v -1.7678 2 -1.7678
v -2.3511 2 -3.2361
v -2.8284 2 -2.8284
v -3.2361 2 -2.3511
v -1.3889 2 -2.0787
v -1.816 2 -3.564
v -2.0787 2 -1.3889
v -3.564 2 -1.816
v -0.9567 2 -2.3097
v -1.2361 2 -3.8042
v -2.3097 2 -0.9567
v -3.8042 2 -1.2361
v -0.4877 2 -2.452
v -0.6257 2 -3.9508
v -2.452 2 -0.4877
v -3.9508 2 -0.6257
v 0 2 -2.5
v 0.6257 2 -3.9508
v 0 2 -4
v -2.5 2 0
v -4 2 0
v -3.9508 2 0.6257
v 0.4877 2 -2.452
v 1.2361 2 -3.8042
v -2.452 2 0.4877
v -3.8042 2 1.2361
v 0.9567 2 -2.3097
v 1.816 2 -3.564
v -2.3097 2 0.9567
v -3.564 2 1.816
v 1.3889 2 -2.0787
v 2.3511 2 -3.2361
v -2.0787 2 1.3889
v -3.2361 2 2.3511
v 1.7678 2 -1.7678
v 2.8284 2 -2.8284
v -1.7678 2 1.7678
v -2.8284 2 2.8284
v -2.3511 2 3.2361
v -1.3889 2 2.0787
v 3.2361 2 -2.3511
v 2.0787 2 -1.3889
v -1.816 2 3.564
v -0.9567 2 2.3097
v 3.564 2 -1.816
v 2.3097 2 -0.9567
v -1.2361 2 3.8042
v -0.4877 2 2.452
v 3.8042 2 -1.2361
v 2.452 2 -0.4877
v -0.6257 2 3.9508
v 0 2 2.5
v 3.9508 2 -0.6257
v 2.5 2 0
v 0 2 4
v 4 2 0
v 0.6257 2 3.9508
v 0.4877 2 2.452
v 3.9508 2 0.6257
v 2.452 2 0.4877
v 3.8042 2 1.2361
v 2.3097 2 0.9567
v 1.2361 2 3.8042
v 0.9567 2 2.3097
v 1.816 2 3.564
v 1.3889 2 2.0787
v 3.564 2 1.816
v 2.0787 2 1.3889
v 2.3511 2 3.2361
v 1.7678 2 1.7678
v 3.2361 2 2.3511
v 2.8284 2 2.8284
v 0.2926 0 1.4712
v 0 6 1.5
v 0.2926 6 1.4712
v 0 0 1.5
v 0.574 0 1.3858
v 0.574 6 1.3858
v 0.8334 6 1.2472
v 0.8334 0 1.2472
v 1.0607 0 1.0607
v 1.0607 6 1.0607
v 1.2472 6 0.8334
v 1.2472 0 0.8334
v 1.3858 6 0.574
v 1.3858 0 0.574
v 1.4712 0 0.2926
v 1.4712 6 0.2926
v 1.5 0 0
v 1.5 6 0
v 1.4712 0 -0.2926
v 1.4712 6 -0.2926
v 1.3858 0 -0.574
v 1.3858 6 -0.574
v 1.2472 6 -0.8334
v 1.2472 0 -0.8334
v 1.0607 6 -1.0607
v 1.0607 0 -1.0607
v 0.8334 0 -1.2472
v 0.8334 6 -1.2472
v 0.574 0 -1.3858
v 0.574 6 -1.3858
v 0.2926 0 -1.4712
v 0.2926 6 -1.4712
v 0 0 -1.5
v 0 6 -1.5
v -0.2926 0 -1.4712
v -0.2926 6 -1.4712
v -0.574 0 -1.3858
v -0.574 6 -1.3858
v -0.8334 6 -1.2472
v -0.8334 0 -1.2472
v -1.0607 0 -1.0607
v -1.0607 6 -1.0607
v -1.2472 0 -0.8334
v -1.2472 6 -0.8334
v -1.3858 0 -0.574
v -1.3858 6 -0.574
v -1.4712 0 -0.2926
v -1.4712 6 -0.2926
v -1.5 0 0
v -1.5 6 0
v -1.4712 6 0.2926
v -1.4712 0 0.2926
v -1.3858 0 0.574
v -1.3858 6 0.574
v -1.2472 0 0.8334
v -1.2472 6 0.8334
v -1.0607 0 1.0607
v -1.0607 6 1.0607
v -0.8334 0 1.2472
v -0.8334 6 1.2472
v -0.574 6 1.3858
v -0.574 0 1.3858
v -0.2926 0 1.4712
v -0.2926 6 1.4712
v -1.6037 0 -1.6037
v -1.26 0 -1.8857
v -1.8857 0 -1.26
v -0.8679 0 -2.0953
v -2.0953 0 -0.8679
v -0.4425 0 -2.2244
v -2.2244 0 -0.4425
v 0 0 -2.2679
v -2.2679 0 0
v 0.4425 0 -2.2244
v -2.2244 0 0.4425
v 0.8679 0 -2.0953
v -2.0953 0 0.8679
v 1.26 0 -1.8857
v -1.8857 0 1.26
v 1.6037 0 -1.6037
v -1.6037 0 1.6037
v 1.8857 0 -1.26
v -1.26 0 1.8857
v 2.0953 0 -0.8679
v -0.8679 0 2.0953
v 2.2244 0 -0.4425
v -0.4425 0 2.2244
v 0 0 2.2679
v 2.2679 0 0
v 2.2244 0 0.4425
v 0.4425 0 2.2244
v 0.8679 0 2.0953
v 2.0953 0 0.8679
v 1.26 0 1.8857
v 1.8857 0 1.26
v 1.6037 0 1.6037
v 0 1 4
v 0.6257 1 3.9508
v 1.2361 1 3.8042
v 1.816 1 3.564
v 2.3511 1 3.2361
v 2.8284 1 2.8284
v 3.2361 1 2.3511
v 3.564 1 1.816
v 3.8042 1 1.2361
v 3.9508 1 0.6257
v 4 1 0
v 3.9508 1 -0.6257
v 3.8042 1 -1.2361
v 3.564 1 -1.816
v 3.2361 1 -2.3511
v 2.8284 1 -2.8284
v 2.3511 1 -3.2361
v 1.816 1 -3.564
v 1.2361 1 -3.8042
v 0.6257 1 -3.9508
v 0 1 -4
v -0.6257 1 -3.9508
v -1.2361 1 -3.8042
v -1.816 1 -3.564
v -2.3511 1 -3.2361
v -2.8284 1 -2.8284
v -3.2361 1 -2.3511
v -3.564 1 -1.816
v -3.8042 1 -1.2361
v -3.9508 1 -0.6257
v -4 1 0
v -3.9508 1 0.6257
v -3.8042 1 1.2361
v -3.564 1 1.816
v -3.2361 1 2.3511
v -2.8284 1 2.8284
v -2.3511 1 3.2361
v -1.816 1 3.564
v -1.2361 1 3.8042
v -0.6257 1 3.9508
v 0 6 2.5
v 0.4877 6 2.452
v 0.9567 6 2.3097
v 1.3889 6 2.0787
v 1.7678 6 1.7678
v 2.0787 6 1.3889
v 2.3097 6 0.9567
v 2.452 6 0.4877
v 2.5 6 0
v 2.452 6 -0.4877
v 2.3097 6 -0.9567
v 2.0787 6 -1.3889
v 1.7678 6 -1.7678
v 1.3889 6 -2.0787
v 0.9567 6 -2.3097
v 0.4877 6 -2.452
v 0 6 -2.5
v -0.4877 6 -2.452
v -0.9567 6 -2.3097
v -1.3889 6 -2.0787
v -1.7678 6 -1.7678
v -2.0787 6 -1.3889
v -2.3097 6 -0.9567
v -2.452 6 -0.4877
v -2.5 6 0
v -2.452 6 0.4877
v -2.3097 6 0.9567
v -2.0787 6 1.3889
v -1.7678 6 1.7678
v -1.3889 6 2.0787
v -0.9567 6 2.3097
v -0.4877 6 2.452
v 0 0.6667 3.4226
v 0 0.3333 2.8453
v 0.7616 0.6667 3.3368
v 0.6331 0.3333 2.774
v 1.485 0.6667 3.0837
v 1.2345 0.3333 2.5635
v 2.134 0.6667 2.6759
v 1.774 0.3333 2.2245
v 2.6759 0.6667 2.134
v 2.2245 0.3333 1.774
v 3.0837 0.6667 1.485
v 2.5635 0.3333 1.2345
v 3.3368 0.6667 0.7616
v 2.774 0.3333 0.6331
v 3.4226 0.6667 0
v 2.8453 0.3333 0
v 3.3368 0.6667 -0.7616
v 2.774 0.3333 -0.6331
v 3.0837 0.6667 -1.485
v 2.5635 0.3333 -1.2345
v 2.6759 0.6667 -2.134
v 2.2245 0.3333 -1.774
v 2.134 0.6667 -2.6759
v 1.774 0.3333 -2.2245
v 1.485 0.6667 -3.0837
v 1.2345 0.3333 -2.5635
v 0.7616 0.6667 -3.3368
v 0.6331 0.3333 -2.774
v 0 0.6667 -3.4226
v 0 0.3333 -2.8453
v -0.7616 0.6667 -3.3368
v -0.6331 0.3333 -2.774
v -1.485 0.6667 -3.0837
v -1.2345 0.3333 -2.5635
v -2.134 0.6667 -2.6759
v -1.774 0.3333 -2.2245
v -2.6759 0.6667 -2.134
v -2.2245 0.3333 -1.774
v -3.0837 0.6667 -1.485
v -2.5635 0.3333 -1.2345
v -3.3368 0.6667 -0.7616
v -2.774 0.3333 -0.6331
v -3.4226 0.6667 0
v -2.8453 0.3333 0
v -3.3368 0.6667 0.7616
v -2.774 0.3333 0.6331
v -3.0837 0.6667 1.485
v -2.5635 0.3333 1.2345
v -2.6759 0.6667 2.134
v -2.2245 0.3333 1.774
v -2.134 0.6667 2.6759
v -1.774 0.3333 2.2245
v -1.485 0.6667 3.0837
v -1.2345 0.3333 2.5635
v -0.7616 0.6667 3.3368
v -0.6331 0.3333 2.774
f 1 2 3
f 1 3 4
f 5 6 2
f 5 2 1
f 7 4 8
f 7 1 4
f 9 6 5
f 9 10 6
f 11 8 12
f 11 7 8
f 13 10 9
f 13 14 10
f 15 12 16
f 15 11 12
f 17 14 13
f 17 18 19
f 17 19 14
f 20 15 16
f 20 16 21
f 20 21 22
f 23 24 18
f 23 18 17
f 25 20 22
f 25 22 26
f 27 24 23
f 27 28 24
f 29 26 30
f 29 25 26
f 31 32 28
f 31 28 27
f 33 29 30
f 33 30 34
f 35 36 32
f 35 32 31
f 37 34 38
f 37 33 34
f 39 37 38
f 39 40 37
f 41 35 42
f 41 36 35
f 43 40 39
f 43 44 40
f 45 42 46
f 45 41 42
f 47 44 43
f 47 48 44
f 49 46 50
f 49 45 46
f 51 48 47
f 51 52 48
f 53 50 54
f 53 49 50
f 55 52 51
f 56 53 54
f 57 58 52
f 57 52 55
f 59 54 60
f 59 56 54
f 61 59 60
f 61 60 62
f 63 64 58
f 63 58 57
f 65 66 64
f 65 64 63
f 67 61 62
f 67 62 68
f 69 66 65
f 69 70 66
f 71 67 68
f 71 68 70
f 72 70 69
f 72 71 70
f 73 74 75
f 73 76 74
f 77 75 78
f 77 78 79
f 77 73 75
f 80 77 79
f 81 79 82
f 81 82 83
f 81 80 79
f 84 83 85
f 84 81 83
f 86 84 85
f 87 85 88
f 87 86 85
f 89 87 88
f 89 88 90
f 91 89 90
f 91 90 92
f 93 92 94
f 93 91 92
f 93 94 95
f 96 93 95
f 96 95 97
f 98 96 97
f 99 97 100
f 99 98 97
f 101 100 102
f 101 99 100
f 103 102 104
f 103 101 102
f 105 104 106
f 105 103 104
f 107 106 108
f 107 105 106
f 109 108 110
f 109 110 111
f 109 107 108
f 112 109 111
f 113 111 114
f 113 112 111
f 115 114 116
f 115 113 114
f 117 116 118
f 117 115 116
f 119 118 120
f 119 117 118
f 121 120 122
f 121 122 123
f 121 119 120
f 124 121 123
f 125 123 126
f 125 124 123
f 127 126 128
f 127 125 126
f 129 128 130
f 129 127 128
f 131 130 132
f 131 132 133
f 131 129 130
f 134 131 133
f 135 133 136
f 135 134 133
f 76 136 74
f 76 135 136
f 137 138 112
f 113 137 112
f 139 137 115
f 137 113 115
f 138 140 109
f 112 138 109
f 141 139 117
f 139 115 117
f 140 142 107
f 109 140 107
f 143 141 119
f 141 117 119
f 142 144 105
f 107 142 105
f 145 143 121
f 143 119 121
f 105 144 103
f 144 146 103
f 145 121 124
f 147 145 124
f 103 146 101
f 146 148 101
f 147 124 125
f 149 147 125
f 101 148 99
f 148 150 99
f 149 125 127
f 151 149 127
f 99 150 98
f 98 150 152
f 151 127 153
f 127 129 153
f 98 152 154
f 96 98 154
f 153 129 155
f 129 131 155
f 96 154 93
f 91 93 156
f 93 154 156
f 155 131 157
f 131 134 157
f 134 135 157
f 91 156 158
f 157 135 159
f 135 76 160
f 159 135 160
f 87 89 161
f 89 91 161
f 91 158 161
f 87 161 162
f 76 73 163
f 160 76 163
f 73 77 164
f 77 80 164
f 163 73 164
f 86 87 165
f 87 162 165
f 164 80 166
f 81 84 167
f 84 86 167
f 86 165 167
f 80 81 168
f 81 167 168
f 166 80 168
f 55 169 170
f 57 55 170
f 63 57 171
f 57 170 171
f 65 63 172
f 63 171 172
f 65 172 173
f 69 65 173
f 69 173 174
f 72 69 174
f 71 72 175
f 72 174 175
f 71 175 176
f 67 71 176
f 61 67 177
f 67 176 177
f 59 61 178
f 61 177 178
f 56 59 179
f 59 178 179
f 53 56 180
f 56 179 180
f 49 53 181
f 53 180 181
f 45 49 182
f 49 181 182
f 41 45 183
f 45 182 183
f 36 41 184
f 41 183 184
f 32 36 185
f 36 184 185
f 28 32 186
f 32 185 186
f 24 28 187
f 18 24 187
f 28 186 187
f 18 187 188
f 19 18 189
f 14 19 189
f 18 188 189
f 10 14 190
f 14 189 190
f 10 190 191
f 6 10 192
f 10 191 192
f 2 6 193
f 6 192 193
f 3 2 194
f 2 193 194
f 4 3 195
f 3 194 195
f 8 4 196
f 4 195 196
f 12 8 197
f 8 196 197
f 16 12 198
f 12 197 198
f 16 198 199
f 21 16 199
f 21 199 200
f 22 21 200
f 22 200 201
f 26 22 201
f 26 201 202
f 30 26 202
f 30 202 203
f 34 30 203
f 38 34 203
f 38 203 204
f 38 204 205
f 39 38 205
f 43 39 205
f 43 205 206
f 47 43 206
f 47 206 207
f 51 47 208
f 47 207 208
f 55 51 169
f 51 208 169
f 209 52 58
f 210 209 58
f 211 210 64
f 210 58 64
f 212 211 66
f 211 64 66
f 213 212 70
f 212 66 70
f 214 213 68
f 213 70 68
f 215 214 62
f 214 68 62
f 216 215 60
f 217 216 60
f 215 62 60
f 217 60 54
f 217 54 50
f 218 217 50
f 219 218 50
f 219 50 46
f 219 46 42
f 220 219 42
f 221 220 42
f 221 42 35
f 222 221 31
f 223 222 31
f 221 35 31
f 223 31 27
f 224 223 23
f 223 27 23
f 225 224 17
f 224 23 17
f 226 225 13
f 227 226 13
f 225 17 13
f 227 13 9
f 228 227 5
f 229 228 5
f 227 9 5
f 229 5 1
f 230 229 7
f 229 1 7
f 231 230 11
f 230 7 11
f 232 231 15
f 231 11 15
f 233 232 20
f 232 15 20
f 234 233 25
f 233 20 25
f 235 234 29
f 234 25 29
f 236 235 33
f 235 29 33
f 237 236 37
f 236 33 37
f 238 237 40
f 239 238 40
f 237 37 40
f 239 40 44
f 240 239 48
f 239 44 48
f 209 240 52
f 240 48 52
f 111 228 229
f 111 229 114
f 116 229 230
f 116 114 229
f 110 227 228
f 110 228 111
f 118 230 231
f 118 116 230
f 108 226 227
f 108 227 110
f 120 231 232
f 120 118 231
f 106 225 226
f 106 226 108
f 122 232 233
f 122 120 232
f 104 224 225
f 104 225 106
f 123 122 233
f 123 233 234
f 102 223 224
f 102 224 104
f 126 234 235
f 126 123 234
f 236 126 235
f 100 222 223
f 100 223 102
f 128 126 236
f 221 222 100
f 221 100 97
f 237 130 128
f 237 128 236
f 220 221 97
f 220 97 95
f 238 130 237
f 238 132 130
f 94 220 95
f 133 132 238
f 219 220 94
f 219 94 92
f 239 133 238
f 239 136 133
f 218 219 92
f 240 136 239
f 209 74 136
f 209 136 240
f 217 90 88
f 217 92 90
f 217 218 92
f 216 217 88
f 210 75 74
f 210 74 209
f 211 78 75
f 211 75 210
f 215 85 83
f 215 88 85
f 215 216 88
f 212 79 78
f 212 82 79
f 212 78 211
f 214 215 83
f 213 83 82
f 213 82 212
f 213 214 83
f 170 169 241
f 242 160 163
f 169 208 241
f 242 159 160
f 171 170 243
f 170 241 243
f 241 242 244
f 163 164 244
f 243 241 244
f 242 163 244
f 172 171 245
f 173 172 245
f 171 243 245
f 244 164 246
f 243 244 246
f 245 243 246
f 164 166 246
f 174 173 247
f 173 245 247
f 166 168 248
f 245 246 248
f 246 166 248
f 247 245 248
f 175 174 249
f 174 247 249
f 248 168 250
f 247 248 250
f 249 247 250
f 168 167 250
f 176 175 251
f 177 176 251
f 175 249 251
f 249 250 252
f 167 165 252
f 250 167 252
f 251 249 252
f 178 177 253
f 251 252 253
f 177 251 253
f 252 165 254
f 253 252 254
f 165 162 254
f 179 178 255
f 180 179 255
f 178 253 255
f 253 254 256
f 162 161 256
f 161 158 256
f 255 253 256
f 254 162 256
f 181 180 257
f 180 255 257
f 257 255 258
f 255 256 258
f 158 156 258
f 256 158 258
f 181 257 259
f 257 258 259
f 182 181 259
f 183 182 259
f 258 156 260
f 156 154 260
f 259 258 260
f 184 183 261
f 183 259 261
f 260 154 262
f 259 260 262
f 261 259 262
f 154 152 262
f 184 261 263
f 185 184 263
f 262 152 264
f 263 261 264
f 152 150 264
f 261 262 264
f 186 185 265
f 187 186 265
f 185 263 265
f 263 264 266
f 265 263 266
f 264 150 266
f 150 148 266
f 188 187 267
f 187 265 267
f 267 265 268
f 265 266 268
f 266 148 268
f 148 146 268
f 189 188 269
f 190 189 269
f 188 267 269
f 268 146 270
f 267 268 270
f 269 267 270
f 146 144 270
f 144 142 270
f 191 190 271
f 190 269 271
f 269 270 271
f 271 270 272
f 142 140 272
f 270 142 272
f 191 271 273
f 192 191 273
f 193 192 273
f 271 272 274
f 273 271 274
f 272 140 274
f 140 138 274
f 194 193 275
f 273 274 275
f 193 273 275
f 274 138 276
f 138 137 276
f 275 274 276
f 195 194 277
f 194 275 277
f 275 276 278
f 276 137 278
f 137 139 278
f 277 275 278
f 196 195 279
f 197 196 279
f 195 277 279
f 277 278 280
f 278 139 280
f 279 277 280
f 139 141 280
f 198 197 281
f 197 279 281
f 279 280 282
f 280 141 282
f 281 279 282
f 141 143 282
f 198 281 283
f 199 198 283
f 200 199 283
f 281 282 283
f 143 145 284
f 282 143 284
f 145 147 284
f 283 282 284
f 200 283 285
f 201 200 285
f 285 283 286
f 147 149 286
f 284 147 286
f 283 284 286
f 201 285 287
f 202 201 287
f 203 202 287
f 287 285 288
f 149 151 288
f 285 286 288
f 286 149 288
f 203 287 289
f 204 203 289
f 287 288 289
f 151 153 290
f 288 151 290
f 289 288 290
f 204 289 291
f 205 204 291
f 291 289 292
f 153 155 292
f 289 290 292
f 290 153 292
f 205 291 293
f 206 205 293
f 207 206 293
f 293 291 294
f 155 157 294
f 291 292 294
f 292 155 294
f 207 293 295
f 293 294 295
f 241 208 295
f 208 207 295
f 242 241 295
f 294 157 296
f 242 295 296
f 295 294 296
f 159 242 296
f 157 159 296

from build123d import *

# Parameters (mm, degrees)
SZKIC1_R                    = 4
SZKIC1_R_2                  = 1.5
DODANIE_WYCI_GNI_CIE1_DEPTH = 2
SZKIC2_R                    = 2.5
SZKIC2_R_2                  = 1.5
DODANIE_WYCI_GNI_CIE2_DEPTH = 4
SFAZOWANIE1_SIZE            = 1
SFAZOWANIE1_SIZE2           = 1.732050808


with BuildPart() as part:
    # Szkic1 → Dodanie-wyciągnięcie1 (new body)
    with BuildSketch(Plane(origin=(0, 0, 0), x_dir=(1, 0, 0), z_dir=(0, 1, 0))):
        with Locations(Location((0, 0, 0), (0, 0, 270))):
            Circle(SZKIC1_R)
        with Locations(Location((0, 0, 0), (0, 0, 270))):
            Circle(SZKIC1_R_2, mode=Mode.SUBTRACT)
    extrude(amount=DODANIE_WYCI_GNI_CIE1_DEPTH)

    # Szkic2 → Dodanie-wyciągnięcie2 (add)
    with BuildSketch(Plane(origin=(0, 2, 0), x_dir=(1, 0, 0), z_dir=(0, 1, 0))):
        with Locations(Location((0, 0, 0), (0, 0, 270))):
            Circle(SZKIC2_R)
        with Locations(Location((0, 0, 0), (0, 0, 270))):
            Circle(SZKIC2_R_2, mode=Mode.SUBTRACT)
    extrude(amount=DODANIE_WYCI_GNI_CIE2_DEPTH)

    # Sfazowanie1
    sfazowanie1_edges = [part.edges().sort_by_distance(p)[0] for p in [
        (0, 0, -4),
    ]]
    sfazowanie1_side = [part.faces().sort_by_distance(p)[0] for p in [
        (0, 1, -4),
    ]]
    chamfer(sfazowanie1_edges, length=SFAZOWANIE1_SIZE, length2=SFAZOWANIE1_SIZE2, reference=sfazowanie1_side[0])


solid = part.part
